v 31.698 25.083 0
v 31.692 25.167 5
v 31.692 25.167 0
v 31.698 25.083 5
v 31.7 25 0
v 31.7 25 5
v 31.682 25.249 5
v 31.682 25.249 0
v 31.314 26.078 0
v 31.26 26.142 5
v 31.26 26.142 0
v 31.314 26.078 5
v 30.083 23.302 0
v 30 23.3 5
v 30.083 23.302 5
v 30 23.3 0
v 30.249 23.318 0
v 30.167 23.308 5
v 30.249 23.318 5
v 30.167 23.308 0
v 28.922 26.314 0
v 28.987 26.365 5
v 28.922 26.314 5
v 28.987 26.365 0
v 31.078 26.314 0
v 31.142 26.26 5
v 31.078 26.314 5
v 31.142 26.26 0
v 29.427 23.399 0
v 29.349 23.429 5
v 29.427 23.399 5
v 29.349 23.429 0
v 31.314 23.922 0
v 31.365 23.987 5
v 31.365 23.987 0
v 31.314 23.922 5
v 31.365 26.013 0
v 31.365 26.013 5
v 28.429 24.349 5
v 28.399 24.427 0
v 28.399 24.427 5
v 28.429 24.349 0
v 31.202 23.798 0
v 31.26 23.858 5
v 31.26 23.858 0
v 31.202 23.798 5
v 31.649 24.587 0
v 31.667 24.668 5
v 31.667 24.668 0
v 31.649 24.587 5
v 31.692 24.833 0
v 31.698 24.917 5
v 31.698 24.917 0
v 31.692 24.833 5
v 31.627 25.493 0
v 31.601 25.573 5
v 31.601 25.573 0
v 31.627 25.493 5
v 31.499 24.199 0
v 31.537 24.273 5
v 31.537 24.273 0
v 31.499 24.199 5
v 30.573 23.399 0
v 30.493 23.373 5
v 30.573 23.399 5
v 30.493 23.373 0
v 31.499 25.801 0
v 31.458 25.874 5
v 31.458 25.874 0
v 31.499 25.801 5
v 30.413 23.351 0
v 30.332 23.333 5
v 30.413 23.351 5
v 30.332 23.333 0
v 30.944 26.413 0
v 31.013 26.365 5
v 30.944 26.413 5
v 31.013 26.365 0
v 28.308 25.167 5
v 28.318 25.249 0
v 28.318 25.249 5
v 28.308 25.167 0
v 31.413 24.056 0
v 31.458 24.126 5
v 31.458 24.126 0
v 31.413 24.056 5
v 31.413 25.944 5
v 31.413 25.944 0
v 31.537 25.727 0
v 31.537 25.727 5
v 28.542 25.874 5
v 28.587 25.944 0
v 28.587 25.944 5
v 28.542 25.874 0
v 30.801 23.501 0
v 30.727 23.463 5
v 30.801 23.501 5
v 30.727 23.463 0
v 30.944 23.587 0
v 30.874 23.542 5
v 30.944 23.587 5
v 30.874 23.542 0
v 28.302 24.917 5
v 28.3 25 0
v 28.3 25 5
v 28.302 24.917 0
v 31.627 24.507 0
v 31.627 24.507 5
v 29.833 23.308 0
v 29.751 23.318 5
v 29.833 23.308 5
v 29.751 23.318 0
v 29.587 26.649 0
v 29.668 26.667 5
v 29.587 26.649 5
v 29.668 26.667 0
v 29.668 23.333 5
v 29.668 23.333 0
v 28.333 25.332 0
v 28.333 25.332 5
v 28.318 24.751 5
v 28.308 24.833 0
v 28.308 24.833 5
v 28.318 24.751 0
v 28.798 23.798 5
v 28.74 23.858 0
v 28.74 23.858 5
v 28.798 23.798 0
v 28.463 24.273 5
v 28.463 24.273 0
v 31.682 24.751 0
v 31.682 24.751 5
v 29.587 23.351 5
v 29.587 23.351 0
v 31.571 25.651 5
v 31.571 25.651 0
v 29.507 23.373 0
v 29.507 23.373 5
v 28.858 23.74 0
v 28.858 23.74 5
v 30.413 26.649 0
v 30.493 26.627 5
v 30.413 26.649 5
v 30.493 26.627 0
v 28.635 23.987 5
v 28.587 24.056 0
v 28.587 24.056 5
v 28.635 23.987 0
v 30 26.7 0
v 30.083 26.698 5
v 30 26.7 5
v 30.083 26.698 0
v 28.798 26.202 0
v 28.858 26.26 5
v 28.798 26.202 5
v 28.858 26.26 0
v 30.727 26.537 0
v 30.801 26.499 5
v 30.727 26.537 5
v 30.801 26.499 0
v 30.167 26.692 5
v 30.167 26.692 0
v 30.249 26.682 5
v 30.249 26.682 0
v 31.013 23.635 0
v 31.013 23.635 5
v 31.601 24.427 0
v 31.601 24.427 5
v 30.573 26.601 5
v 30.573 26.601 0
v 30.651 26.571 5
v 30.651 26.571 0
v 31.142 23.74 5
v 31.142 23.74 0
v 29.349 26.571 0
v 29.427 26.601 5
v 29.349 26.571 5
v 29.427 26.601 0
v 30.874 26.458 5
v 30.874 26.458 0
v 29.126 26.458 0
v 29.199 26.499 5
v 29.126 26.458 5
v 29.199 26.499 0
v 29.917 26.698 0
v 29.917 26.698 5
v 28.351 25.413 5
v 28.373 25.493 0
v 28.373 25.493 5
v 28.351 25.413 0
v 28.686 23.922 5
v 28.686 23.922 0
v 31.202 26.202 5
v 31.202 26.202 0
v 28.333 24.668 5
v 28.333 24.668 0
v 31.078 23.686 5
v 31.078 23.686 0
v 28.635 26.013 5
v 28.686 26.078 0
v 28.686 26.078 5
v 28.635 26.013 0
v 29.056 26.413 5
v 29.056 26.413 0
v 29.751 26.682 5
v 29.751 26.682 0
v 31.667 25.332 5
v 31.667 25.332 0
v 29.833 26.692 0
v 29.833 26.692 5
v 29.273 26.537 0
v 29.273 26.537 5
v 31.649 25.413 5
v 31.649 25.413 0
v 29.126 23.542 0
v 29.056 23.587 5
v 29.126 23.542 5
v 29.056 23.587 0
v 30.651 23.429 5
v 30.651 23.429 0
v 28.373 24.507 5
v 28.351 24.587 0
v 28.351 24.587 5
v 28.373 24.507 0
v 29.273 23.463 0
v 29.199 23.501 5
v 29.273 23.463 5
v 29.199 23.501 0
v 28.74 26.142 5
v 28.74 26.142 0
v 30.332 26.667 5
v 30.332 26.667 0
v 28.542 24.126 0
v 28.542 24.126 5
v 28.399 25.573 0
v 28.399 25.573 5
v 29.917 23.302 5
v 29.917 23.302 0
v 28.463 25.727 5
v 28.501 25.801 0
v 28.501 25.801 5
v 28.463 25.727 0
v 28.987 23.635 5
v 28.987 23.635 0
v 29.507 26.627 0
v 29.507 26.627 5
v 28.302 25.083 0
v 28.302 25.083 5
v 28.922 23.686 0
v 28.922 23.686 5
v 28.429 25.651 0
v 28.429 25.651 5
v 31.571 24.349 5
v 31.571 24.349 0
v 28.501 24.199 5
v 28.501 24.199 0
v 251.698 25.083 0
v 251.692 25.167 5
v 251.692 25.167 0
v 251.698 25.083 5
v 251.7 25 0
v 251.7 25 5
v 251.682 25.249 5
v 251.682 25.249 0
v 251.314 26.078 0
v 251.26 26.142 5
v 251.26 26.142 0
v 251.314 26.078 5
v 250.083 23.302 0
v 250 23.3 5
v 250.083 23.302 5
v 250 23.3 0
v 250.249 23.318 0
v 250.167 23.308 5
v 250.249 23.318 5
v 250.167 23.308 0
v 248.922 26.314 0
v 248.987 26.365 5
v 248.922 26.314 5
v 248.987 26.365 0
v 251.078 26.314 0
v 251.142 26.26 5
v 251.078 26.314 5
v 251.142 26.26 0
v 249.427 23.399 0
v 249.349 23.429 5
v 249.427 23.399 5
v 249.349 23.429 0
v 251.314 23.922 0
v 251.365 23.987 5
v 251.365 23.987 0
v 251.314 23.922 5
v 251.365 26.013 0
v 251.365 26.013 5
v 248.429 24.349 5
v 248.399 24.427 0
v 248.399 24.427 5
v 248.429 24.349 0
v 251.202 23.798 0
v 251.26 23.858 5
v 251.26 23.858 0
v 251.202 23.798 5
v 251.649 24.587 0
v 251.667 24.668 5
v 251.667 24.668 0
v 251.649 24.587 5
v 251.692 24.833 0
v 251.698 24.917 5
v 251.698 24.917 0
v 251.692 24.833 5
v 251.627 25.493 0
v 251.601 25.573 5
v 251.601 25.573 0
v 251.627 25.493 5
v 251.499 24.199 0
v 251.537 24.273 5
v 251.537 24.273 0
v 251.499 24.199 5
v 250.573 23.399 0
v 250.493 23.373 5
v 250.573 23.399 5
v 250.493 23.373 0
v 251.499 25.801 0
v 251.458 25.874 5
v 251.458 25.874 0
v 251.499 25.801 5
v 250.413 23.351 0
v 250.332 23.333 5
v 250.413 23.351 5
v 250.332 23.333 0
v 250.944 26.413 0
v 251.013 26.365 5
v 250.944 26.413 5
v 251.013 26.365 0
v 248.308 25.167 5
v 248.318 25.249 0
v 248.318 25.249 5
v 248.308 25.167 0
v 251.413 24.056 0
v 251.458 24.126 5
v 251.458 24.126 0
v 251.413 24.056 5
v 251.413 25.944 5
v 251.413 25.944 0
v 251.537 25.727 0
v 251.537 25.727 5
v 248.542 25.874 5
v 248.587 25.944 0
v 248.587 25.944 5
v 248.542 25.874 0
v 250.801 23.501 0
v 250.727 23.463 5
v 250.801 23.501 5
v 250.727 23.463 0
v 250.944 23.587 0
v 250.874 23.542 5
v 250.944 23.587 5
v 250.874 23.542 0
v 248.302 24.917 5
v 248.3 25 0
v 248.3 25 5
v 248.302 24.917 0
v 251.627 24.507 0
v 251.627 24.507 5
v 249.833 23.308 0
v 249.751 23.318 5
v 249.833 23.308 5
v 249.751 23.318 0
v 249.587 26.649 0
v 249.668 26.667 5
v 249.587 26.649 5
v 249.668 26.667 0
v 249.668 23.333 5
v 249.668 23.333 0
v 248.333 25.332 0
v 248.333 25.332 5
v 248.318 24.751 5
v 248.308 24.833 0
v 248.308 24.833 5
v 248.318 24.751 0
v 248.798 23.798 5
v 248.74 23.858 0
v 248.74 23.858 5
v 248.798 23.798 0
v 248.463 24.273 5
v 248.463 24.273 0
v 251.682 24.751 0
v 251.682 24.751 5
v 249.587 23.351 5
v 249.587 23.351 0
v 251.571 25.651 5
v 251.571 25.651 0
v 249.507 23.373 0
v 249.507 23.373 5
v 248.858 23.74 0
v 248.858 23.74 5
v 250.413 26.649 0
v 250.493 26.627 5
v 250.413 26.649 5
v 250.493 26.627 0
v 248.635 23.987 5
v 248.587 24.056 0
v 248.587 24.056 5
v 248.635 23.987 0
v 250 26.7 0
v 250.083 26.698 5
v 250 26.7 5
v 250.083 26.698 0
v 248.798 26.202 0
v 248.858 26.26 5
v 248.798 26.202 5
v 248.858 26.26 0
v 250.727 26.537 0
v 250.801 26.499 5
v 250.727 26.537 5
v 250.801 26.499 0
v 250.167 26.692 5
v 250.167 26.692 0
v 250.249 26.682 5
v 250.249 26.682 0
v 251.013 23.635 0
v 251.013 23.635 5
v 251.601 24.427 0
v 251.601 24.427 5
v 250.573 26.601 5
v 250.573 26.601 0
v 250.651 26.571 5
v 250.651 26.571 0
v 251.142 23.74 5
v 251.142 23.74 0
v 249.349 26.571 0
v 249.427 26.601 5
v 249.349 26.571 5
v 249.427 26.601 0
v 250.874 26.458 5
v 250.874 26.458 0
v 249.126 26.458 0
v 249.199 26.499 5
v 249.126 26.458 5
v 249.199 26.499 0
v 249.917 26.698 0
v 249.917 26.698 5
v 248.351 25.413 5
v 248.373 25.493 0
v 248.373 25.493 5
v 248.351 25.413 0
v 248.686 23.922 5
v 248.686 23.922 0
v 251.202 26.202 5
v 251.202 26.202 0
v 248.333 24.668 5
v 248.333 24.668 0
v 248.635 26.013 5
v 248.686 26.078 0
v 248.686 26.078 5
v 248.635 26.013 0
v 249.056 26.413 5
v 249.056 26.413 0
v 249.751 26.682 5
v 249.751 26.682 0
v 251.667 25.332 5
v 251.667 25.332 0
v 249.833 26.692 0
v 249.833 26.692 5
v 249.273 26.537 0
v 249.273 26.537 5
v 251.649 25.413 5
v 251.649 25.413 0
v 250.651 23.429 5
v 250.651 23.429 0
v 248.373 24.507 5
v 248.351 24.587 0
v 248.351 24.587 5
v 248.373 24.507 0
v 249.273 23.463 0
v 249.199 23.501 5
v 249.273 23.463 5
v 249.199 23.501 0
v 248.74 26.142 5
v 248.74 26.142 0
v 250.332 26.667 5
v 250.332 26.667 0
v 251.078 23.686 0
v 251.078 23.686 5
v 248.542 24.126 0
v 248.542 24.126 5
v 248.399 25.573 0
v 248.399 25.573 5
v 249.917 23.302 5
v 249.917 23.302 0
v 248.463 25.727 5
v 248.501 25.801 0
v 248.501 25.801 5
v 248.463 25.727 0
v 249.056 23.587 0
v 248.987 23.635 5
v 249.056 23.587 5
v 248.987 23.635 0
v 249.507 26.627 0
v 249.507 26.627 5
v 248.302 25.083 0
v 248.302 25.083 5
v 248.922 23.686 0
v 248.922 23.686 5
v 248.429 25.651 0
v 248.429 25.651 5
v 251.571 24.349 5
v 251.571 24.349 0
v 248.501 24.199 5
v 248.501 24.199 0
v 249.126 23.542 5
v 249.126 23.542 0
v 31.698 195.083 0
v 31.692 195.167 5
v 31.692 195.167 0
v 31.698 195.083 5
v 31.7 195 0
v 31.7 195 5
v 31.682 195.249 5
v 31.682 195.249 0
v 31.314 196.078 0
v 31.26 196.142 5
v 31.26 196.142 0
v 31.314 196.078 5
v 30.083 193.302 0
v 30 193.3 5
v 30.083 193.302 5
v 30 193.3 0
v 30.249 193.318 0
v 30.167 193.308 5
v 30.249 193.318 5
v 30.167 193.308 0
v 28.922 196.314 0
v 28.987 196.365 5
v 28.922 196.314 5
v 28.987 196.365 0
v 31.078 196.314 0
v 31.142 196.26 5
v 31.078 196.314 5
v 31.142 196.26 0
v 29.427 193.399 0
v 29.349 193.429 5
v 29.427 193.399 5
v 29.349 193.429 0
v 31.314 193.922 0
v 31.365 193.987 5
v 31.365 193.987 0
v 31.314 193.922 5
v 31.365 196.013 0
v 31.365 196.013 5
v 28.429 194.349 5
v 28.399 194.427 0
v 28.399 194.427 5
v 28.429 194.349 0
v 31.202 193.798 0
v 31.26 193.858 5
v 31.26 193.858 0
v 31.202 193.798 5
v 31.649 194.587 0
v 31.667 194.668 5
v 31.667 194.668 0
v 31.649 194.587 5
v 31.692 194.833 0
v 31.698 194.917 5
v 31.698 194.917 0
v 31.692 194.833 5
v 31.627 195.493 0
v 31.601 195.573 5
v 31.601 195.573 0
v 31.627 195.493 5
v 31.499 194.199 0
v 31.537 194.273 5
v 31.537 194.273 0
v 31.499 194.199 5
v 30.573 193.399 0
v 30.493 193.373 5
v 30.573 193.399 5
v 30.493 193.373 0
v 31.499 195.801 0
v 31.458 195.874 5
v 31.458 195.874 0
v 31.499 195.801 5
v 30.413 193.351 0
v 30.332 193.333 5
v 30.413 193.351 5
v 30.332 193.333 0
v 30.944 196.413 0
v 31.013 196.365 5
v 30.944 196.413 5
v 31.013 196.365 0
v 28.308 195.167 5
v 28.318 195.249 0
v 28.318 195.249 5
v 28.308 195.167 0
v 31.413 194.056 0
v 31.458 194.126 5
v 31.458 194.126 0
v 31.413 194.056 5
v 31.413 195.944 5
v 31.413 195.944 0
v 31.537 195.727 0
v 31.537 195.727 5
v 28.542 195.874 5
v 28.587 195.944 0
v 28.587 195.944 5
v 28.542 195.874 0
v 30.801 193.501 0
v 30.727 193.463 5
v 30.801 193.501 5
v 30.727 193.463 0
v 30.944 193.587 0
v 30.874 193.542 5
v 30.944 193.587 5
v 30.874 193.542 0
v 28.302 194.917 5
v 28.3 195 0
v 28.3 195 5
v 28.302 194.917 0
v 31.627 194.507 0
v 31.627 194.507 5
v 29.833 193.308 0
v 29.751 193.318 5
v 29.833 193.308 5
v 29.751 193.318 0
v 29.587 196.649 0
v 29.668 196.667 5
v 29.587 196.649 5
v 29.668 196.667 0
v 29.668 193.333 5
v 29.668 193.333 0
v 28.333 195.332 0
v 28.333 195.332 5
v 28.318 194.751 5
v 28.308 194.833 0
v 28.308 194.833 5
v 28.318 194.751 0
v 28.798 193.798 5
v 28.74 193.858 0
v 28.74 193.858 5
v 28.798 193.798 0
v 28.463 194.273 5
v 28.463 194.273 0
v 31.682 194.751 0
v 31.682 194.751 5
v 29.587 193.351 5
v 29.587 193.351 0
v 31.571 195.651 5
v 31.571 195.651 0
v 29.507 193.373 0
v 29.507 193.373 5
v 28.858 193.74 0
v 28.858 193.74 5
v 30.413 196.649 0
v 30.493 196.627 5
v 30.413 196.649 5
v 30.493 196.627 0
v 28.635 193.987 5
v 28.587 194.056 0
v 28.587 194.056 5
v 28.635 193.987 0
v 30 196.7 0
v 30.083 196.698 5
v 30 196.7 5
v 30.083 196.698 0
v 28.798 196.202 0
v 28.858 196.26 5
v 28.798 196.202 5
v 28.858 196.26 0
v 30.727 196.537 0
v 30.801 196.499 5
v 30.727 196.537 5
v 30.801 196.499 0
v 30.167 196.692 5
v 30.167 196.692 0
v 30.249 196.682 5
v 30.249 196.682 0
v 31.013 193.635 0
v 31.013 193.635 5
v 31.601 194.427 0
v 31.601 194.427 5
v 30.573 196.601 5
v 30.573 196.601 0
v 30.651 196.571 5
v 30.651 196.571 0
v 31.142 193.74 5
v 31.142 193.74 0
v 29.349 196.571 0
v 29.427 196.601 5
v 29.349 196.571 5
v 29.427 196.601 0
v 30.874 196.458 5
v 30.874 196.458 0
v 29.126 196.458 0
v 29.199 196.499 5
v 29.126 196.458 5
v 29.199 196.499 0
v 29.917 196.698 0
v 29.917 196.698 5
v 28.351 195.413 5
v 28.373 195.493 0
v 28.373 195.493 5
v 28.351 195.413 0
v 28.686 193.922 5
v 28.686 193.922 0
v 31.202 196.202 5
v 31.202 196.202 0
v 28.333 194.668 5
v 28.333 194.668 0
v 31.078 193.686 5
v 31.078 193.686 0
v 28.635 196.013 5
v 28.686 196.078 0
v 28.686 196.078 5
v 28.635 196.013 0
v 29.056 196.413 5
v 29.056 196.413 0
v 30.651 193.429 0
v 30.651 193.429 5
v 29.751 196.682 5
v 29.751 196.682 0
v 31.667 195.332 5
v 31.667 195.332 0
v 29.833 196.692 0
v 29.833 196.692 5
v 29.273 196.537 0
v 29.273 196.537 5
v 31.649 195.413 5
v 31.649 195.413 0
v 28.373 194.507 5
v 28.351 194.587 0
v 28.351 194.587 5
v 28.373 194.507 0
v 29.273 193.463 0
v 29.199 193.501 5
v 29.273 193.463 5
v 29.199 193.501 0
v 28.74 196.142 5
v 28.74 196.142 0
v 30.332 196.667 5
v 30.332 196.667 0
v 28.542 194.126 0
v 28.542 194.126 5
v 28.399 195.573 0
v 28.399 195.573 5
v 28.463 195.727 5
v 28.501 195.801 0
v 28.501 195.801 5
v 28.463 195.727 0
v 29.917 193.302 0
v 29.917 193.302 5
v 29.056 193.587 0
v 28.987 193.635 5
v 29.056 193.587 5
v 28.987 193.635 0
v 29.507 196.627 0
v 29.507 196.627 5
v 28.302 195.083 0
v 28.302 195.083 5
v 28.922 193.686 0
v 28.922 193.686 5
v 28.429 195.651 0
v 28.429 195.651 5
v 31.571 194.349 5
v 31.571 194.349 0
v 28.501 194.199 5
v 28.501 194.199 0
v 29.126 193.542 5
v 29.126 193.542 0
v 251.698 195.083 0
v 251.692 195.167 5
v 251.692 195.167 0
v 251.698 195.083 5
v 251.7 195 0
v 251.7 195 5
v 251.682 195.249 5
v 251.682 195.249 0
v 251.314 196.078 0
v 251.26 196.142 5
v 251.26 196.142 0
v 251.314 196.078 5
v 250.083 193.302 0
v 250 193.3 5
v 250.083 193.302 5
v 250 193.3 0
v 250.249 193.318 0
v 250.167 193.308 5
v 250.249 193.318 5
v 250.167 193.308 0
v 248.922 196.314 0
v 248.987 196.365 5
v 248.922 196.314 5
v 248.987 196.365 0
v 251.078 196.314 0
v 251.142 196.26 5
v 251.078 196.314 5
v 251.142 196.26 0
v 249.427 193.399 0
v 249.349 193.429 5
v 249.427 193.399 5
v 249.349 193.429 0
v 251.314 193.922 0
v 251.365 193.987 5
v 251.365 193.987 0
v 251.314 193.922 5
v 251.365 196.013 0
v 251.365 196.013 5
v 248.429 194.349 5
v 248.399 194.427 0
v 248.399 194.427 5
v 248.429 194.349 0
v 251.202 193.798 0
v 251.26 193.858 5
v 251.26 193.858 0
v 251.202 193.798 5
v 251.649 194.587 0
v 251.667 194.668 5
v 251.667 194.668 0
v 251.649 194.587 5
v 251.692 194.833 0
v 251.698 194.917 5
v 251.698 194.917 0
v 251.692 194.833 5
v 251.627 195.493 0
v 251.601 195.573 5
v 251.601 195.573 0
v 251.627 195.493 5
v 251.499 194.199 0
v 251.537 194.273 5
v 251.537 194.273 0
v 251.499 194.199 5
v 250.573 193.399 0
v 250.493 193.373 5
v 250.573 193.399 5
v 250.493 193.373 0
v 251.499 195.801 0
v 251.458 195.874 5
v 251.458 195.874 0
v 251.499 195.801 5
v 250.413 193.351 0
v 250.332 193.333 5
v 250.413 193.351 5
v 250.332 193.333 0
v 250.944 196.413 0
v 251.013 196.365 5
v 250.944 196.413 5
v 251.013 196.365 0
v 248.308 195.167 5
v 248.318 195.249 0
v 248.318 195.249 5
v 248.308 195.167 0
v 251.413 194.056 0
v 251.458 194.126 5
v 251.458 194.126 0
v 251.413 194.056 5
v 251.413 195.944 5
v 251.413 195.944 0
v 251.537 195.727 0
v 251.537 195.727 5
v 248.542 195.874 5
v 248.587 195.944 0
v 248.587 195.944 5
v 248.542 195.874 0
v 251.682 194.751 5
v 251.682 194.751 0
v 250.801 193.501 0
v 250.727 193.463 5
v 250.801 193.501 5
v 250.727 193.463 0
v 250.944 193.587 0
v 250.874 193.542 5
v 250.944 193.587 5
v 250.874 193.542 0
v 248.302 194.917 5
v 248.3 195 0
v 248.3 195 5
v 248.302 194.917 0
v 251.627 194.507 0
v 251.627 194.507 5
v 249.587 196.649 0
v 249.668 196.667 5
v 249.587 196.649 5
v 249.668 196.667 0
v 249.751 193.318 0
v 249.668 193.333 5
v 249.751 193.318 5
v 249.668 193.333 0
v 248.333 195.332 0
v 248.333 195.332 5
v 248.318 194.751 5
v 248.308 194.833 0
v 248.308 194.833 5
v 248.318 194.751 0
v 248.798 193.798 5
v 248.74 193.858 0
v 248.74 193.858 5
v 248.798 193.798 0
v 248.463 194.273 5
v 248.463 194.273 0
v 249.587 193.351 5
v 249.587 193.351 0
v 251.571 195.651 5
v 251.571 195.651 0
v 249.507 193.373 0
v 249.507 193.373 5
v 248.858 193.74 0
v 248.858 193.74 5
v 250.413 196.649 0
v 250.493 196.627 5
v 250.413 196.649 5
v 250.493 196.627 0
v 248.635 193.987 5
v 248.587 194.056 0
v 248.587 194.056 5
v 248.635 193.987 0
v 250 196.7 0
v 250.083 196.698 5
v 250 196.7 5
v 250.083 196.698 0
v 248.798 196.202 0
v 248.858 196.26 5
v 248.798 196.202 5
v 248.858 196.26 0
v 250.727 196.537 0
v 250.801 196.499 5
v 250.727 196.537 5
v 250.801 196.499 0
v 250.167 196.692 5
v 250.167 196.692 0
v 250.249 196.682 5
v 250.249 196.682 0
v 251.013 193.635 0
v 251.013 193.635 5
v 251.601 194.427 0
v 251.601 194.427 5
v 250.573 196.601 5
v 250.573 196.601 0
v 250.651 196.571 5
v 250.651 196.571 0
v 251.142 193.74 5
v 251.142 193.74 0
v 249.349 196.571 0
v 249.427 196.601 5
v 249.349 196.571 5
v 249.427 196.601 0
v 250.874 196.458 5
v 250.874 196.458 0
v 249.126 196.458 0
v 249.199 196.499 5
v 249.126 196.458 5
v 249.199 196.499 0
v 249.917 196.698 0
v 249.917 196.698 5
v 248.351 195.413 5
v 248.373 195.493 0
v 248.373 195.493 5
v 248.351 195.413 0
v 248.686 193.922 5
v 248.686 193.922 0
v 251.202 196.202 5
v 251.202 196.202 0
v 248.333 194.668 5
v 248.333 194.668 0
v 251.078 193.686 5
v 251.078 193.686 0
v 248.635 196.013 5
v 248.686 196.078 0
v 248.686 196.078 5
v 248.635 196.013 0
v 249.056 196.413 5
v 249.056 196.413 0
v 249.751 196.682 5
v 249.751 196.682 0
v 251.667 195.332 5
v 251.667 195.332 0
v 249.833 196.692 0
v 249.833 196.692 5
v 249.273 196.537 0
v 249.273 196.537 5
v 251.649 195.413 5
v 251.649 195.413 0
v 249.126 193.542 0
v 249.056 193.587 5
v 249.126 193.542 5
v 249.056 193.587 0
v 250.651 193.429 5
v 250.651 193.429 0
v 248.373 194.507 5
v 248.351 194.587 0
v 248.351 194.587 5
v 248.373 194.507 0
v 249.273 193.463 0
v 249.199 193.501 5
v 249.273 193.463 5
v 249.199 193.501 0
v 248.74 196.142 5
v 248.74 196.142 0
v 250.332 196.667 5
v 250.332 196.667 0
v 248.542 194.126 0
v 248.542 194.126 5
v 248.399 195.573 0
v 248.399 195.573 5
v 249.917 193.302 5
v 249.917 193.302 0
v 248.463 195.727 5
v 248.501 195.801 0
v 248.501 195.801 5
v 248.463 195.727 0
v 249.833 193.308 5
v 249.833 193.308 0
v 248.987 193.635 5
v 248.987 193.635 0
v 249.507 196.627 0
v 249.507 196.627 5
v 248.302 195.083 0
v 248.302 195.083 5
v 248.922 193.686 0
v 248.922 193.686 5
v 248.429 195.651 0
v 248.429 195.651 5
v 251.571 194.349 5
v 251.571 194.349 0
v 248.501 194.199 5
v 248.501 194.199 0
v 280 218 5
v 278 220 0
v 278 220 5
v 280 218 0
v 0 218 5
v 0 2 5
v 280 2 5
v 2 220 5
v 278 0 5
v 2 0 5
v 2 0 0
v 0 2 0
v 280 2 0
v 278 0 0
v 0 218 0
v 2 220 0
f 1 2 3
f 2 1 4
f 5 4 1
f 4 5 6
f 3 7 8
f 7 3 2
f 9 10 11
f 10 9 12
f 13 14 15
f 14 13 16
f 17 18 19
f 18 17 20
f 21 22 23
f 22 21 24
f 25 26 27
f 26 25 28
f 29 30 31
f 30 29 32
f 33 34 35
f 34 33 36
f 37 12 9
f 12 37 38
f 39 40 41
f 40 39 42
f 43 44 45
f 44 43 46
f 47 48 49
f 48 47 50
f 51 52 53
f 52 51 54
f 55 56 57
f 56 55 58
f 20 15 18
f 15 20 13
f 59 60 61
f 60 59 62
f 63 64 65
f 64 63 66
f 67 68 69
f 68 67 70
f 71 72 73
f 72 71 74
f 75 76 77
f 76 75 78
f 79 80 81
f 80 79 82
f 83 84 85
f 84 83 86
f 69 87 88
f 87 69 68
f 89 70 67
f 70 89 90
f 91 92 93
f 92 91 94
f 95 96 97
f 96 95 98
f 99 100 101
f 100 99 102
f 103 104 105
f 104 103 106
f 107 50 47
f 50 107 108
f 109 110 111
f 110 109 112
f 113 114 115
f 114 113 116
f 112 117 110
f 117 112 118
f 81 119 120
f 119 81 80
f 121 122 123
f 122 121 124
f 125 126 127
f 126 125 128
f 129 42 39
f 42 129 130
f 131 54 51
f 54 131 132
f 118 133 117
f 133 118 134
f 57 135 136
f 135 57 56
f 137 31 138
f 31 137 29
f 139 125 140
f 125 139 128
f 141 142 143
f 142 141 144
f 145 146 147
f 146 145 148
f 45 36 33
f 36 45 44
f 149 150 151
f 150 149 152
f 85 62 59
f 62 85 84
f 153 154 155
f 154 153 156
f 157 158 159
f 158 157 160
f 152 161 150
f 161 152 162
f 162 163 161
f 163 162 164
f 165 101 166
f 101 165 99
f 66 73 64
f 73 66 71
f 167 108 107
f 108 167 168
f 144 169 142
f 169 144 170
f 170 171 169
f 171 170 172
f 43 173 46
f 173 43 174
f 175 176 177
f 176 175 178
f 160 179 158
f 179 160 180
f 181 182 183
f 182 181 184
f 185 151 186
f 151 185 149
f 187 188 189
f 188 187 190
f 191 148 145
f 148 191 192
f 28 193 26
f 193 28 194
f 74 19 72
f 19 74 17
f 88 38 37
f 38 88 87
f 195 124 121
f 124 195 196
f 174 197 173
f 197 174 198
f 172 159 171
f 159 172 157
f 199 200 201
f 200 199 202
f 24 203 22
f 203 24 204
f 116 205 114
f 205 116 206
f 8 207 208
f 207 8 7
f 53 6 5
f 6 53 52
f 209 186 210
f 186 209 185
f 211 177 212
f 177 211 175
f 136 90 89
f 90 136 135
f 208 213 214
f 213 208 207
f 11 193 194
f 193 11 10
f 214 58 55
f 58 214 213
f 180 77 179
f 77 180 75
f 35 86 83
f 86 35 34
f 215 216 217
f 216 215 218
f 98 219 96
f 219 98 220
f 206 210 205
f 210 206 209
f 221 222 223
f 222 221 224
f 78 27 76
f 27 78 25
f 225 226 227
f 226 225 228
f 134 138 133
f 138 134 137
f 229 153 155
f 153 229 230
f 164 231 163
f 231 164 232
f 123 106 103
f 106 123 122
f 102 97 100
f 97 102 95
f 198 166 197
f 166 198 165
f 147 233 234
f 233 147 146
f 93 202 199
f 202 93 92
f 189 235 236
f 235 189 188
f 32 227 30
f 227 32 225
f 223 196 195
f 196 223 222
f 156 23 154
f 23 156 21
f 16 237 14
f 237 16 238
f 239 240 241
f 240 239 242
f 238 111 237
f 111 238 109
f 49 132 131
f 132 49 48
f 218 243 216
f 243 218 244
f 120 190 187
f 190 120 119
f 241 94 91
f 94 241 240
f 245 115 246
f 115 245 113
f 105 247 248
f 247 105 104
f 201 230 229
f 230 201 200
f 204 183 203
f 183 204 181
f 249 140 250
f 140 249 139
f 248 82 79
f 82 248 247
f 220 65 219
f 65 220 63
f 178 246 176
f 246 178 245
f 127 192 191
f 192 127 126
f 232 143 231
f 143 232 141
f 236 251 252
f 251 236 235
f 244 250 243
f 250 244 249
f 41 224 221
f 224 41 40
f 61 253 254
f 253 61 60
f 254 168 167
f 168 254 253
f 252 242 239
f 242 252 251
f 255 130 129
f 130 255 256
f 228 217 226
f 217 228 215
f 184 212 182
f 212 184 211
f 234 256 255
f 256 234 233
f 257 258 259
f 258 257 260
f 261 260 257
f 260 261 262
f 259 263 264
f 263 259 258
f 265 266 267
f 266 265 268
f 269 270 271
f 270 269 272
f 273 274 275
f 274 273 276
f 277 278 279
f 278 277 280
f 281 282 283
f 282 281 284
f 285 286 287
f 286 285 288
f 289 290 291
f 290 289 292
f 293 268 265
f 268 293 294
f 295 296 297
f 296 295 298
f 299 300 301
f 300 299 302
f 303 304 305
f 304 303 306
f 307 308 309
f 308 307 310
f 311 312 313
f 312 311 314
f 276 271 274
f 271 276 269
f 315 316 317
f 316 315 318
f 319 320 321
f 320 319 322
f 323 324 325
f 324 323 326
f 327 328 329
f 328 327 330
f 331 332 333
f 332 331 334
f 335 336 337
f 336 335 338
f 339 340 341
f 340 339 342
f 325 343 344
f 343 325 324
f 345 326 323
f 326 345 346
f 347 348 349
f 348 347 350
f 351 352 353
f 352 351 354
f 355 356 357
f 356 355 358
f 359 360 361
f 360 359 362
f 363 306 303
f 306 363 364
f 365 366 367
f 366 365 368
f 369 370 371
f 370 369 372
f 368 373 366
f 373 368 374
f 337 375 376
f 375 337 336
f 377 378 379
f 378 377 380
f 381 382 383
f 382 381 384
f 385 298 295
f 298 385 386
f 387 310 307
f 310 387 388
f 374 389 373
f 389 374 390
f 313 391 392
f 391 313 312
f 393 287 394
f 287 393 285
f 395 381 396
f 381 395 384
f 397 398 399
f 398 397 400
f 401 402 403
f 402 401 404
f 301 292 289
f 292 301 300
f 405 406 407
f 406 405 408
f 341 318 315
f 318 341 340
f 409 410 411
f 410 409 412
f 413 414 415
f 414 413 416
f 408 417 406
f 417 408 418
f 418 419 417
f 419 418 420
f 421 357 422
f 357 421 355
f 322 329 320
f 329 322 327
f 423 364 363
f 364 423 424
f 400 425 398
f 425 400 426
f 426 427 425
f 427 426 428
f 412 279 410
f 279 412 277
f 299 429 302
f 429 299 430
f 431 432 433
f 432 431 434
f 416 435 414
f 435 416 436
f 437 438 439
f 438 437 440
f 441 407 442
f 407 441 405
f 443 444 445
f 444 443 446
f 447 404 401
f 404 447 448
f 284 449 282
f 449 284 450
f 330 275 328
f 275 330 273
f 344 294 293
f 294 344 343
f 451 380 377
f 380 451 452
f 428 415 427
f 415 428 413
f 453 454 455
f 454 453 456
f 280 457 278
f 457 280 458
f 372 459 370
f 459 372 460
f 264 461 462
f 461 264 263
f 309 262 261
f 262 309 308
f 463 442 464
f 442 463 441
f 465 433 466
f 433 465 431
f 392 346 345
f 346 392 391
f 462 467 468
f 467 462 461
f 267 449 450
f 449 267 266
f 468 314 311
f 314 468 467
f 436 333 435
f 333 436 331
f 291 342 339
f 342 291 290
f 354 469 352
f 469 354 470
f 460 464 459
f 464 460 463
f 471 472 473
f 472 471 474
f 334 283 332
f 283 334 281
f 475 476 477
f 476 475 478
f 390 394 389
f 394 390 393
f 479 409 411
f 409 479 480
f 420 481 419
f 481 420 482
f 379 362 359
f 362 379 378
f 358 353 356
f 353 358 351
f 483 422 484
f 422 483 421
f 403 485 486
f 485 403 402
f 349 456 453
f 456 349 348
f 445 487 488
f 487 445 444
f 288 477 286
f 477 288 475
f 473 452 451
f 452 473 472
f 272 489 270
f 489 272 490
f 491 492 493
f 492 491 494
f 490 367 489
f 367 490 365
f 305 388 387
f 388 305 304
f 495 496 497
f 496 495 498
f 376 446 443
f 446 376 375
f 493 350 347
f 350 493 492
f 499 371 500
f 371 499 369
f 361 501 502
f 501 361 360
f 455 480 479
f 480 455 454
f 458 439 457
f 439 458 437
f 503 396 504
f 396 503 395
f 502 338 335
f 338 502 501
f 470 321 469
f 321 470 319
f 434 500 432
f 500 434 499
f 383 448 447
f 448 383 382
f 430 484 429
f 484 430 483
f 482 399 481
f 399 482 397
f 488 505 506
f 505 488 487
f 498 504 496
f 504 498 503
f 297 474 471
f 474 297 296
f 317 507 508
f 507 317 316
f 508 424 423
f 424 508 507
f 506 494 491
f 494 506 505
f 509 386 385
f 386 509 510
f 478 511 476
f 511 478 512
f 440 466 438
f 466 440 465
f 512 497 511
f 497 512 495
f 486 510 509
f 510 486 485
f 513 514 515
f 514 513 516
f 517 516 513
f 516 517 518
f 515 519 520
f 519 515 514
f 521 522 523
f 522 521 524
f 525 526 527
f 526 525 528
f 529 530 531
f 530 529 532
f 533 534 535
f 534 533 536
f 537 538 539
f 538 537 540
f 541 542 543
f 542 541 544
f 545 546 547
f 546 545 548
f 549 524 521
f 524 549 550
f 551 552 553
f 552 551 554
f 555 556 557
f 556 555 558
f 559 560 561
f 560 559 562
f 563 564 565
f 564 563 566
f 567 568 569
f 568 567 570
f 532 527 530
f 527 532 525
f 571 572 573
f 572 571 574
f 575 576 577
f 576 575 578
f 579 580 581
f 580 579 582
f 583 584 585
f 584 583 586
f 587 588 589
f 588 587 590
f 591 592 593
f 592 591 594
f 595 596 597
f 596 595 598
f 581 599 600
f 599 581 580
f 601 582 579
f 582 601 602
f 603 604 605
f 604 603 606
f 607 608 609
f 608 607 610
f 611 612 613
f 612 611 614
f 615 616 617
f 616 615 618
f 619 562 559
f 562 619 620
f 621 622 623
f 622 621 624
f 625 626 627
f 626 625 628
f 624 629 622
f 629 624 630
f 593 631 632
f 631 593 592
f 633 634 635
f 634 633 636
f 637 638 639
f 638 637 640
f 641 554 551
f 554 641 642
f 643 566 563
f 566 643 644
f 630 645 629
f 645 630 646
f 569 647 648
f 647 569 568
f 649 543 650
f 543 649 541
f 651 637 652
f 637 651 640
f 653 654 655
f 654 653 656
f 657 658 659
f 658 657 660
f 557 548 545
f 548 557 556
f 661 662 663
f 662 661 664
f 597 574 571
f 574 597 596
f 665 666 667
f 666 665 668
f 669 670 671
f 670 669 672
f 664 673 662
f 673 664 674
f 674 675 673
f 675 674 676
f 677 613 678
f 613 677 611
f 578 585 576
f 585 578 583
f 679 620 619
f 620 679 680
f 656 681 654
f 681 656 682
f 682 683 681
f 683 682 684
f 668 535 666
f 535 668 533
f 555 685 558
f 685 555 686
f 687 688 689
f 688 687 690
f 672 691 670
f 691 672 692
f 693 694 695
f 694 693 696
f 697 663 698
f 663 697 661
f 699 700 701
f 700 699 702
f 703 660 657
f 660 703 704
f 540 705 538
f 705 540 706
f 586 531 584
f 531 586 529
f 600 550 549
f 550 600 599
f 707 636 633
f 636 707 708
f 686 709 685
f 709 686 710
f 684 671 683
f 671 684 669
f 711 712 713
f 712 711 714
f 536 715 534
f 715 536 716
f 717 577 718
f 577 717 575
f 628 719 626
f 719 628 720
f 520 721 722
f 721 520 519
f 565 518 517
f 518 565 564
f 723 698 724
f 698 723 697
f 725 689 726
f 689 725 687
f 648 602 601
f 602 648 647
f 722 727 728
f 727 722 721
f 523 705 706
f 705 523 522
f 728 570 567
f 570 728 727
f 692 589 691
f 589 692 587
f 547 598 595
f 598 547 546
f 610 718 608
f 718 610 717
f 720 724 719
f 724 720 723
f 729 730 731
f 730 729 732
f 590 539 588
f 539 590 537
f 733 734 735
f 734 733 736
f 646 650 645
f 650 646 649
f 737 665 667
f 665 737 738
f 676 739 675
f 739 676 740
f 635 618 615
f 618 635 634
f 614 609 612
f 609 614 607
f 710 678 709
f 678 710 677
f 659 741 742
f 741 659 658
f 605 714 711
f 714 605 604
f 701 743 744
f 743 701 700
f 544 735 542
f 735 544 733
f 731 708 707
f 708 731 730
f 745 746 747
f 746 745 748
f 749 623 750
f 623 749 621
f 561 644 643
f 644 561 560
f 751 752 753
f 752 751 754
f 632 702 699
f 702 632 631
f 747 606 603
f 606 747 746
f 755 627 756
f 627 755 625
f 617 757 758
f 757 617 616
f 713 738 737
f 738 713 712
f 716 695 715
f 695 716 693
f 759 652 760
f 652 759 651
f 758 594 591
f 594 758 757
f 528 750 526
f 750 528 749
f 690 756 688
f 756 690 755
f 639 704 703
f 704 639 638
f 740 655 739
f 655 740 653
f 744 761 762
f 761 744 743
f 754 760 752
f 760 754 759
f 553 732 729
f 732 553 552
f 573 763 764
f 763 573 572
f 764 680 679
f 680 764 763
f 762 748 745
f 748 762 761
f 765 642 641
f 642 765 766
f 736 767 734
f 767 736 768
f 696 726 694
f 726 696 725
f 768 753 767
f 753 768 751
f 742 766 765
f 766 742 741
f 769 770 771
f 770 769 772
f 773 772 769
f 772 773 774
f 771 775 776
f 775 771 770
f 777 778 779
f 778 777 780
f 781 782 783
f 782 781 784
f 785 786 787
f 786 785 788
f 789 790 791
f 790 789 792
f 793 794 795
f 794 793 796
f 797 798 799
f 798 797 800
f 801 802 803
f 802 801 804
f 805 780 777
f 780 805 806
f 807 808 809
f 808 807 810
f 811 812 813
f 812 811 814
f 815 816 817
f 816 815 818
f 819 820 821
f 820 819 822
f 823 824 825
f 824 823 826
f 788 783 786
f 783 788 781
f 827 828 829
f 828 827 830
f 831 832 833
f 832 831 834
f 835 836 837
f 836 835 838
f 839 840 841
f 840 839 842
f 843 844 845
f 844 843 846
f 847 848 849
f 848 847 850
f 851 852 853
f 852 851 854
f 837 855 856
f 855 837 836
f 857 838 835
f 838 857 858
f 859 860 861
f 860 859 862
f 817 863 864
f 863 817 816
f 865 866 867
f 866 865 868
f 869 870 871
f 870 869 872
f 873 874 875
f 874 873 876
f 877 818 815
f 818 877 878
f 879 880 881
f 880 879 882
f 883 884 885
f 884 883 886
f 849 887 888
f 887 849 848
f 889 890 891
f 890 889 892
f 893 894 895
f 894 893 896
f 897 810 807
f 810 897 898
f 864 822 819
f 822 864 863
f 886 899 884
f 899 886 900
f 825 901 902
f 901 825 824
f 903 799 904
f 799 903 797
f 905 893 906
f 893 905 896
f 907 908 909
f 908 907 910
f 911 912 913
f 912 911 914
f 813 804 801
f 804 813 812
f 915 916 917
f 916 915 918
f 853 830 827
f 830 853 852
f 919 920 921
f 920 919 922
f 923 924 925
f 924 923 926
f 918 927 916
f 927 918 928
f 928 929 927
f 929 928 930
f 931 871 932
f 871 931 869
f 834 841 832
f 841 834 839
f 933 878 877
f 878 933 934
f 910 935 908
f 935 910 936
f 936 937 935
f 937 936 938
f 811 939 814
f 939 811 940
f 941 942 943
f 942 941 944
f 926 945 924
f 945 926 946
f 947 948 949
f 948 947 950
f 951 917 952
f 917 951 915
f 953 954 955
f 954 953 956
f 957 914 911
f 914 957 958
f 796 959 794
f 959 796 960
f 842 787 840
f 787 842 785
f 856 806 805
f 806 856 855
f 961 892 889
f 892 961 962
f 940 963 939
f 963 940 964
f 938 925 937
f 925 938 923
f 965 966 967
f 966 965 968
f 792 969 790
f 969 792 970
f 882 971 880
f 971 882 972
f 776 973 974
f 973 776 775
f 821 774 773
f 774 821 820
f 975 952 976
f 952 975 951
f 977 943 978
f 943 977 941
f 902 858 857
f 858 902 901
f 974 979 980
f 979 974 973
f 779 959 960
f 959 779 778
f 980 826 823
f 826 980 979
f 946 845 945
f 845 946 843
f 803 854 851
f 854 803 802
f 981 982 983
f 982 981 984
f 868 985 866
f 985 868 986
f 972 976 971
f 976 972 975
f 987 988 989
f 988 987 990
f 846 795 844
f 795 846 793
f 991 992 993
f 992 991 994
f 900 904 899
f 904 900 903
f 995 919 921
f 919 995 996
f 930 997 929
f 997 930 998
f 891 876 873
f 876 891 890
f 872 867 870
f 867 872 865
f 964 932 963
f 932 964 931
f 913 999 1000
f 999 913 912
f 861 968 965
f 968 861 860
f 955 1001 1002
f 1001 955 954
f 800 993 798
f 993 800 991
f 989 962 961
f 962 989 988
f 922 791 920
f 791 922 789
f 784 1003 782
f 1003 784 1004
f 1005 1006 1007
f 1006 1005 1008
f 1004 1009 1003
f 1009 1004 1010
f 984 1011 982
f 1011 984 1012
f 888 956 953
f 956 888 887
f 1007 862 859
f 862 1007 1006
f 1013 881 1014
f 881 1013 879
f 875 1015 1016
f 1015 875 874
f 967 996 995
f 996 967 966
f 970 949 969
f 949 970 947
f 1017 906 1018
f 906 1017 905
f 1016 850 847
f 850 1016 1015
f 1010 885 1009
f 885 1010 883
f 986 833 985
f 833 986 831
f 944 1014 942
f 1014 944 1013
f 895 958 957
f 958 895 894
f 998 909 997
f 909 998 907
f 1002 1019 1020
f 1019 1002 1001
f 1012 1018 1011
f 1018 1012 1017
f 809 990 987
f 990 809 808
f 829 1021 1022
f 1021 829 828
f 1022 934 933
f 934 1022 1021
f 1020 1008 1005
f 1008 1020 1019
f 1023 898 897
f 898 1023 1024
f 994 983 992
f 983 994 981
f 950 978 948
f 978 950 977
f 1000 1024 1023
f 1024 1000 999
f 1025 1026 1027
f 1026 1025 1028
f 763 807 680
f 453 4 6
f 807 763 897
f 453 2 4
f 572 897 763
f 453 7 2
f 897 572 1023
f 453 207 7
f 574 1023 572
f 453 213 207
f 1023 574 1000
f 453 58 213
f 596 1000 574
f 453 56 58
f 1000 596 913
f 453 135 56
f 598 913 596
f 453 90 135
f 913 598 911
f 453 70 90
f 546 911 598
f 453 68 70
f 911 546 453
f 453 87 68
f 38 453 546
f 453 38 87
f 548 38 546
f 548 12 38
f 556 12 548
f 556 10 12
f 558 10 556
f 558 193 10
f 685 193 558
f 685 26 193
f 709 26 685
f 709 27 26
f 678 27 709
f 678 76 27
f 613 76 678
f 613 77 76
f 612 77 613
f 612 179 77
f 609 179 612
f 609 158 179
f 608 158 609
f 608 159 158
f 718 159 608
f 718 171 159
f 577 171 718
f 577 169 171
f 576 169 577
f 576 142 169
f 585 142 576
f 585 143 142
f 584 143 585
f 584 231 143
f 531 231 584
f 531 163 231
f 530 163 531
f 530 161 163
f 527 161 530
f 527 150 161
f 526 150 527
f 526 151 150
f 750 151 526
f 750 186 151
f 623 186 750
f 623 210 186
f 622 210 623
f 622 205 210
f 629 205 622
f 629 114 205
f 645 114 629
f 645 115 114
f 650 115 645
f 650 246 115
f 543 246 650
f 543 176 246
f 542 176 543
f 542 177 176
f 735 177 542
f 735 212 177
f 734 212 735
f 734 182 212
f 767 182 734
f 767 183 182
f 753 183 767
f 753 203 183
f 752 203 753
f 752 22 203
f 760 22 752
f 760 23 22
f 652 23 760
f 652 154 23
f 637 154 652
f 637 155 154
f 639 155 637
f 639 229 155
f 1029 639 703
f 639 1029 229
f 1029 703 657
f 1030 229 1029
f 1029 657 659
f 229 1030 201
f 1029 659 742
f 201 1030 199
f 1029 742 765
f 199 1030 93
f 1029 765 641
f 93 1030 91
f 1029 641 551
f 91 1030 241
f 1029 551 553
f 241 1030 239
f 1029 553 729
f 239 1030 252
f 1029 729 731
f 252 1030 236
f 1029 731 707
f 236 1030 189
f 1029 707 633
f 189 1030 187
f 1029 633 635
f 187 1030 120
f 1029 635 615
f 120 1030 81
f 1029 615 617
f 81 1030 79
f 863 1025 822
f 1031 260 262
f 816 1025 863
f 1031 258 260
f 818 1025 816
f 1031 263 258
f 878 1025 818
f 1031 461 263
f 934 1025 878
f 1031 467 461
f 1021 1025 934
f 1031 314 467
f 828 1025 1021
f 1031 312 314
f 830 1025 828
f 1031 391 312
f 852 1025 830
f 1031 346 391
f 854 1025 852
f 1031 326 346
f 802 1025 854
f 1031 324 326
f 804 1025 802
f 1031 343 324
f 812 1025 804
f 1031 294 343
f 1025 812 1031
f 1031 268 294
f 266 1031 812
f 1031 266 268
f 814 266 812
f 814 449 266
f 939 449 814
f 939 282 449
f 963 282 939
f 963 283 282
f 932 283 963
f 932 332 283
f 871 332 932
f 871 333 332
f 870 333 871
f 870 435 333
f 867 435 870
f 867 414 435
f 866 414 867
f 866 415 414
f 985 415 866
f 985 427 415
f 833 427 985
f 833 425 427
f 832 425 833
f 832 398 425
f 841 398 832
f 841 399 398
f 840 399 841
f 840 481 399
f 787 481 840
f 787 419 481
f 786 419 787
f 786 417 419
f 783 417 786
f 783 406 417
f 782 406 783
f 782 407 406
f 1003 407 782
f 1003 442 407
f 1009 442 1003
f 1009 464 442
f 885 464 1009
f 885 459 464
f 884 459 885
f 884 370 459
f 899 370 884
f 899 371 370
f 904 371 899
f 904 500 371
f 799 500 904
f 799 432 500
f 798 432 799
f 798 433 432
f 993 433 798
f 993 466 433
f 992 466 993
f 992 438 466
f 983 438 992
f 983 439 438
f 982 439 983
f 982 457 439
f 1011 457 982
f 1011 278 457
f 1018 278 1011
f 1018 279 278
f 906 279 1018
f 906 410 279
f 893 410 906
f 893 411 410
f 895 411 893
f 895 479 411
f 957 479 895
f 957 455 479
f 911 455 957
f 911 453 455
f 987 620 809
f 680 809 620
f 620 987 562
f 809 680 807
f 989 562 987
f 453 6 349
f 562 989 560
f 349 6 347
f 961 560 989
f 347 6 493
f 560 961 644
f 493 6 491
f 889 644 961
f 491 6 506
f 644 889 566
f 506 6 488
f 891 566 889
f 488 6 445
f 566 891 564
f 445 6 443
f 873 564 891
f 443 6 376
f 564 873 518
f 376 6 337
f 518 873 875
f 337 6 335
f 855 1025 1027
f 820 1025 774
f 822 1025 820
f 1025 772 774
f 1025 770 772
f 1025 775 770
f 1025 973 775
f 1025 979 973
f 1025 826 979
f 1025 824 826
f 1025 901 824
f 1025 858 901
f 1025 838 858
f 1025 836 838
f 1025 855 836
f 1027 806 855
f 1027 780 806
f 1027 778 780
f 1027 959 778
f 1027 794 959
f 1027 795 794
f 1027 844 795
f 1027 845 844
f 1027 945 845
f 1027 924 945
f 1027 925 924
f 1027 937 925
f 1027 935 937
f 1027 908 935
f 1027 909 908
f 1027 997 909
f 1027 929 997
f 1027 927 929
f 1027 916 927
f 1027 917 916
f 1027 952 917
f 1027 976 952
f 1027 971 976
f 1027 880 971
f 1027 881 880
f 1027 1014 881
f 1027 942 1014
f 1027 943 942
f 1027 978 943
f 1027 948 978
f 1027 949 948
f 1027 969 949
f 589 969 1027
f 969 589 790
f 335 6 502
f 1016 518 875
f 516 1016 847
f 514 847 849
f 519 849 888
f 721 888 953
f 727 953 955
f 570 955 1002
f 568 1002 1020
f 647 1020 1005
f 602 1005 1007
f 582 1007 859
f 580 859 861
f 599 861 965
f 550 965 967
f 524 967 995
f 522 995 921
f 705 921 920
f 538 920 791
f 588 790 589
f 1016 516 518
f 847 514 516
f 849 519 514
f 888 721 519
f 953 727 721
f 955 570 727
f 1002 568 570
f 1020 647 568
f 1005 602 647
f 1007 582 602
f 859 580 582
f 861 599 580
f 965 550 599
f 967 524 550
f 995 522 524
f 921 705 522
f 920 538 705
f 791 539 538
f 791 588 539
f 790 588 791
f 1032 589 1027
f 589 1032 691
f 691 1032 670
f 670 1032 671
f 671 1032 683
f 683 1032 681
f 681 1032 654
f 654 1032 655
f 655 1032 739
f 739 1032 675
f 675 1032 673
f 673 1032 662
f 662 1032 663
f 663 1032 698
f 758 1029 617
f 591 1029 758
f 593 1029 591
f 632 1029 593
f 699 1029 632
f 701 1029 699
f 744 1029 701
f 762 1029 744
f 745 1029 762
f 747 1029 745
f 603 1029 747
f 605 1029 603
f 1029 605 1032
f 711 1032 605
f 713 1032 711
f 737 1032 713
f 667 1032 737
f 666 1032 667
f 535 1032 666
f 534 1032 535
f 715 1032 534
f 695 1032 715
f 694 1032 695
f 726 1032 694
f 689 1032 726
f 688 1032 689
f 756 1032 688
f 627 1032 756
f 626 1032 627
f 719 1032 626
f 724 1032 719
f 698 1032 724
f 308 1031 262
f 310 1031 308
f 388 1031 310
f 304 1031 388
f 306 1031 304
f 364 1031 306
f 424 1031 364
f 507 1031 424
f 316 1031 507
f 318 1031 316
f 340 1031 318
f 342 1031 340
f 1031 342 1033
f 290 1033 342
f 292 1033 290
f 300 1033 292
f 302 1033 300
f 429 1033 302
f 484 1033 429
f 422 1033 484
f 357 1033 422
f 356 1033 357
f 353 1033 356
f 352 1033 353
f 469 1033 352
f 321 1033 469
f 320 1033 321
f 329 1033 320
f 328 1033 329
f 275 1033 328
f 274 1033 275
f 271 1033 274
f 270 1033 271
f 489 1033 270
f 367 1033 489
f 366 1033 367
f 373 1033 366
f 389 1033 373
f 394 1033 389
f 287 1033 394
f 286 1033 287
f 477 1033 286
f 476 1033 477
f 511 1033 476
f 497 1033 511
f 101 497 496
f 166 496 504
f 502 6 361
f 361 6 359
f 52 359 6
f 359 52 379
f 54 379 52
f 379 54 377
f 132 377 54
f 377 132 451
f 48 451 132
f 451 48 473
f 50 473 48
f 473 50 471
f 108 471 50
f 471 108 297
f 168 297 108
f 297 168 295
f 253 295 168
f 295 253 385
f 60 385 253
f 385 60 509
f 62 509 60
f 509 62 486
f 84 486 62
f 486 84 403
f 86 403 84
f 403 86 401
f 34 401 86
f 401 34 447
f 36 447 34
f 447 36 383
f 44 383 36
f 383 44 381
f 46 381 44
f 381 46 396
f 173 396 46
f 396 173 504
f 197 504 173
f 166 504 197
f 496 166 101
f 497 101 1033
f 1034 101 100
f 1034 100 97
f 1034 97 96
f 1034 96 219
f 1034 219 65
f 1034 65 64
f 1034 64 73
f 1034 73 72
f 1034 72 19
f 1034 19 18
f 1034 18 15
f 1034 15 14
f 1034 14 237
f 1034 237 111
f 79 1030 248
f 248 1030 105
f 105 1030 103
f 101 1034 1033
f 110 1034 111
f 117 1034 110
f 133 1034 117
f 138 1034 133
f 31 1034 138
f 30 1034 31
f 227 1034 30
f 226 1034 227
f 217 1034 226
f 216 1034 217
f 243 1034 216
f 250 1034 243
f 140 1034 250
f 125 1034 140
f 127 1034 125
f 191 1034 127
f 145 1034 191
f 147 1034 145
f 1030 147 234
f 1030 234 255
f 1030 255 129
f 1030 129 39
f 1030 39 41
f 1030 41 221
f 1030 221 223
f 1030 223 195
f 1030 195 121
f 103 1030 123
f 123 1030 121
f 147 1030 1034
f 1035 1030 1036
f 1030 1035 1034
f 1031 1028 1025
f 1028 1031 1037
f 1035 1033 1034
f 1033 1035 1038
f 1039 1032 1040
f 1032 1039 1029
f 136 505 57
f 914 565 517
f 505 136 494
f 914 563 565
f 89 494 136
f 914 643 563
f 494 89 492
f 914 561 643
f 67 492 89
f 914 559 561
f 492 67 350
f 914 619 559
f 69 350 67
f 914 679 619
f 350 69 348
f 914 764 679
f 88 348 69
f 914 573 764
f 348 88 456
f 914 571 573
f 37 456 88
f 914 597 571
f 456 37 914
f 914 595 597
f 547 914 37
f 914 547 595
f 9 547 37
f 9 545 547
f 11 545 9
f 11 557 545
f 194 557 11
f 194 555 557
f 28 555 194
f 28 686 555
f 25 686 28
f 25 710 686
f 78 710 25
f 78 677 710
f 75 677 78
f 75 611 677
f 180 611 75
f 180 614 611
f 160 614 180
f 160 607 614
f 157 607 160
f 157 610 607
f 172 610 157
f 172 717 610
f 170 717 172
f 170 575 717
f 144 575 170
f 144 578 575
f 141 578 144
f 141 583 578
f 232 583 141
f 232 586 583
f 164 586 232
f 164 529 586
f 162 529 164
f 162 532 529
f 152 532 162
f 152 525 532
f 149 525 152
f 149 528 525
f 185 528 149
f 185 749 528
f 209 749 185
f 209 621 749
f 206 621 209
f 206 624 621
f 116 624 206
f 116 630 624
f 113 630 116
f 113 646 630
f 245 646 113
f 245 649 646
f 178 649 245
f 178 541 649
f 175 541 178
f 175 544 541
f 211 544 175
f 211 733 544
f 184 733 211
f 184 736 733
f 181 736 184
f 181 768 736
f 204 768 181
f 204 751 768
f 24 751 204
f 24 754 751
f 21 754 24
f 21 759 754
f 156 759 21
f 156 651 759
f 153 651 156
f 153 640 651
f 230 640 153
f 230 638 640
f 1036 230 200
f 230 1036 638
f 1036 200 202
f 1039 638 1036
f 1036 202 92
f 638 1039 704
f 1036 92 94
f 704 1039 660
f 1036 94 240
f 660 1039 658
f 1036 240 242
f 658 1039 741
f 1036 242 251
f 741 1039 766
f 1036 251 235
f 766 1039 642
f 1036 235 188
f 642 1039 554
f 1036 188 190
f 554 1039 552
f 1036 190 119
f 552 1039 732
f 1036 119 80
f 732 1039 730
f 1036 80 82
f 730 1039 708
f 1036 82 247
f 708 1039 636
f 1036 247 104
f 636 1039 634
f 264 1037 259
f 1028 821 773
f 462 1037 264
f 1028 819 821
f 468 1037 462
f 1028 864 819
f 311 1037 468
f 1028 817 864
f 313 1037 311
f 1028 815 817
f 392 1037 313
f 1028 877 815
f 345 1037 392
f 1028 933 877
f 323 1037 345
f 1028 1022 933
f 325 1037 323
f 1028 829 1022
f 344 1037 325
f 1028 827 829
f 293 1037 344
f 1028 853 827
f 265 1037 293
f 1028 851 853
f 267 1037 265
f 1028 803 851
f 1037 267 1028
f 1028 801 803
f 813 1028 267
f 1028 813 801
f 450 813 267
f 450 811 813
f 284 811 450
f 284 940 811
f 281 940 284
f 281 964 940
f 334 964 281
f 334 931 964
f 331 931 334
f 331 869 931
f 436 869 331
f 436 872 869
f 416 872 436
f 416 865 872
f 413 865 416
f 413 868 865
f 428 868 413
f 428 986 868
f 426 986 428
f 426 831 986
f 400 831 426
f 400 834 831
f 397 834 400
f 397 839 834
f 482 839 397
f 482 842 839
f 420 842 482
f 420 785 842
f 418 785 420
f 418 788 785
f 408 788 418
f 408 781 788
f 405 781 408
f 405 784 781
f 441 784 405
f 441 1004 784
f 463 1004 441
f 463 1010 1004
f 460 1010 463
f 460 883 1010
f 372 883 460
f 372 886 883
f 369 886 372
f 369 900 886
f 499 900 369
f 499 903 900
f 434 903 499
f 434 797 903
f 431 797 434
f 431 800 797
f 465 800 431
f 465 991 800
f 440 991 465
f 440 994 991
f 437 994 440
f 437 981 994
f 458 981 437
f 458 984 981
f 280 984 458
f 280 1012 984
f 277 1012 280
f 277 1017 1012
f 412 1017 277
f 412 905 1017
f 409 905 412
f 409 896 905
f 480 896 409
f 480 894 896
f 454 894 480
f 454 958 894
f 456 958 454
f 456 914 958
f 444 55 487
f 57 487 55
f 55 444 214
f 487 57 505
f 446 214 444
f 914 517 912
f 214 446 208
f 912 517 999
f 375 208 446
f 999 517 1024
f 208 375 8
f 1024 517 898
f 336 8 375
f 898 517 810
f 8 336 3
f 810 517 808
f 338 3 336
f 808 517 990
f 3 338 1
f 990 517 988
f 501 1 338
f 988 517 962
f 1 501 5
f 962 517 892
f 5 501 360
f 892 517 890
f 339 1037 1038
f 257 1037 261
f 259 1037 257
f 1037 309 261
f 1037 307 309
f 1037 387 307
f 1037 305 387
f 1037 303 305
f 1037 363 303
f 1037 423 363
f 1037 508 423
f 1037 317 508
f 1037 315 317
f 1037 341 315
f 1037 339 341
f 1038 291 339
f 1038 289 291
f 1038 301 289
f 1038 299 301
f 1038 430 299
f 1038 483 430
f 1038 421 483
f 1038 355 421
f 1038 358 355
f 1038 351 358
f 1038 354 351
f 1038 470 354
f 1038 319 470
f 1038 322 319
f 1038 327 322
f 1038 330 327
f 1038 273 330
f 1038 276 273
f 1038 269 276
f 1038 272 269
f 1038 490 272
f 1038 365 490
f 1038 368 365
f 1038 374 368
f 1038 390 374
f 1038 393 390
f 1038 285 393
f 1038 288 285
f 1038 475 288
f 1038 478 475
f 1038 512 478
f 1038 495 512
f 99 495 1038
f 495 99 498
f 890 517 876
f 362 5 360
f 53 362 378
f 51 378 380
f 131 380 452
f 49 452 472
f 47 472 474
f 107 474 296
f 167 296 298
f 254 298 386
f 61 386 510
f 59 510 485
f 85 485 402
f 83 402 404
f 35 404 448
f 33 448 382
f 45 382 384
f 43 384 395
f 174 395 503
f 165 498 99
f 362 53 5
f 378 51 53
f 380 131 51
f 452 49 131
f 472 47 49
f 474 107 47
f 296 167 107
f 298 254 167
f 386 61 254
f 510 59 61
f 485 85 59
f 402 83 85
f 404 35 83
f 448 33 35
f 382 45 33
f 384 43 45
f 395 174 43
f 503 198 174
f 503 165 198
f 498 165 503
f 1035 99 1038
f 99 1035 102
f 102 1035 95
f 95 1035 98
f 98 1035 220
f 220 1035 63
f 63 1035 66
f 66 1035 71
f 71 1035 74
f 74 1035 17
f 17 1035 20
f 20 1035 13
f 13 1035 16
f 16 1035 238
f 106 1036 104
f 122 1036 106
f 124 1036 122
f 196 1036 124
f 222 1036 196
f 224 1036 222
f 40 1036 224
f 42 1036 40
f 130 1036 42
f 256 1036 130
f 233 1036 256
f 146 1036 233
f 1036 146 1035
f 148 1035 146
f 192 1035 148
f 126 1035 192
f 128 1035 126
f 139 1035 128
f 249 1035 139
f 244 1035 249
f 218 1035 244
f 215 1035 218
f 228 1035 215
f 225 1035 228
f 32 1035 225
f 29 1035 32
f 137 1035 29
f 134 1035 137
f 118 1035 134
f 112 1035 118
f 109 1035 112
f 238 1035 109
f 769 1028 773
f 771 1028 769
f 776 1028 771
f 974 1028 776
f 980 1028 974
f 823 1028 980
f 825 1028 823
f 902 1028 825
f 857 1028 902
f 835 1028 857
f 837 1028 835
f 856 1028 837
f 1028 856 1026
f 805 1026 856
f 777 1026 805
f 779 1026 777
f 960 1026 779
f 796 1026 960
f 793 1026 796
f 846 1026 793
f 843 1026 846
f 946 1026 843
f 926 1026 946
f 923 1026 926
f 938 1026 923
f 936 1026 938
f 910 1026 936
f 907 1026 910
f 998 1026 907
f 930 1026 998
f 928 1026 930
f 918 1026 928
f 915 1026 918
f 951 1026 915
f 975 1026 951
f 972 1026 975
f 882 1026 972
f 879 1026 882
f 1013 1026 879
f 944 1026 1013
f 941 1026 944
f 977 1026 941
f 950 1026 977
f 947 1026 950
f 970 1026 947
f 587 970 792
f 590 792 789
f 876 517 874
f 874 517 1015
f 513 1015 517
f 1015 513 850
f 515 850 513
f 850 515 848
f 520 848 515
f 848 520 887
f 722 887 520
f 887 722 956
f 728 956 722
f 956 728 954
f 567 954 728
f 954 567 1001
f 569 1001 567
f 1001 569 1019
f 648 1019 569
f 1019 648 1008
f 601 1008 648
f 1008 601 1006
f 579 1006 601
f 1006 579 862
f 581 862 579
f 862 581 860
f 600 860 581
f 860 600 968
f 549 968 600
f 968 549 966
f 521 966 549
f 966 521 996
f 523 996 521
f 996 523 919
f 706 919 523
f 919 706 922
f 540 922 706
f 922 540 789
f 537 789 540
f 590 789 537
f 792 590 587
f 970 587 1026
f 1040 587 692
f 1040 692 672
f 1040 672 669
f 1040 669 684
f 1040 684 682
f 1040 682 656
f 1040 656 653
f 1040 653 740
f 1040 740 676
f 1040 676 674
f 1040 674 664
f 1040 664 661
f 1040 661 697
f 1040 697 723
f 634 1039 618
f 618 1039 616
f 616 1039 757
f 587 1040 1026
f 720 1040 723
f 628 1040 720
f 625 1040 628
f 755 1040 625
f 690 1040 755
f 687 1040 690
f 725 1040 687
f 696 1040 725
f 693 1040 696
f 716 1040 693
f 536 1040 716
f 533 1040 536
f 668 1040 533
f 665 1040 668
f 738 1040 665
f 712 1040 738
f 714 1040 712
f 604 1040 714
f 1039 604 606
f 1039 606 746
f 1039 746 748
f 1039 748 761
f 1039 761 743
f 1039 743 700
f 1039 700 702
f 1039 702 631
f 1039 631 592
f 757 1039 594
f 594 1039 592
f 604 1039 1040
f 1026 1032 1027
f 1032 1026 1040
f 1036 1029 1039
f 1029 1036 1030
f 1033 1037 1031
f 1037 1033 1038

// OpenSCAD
// Units: mm. Set part to P01 or P02. Whole plates only; split CAD is build_models.py.
$fn=128;
part="P01";
thickness=5;
hole_d=3.4;
module plate(L,W,H){
 difference(){
 linear_extrude(thickness) polygon([[2,0],[L-2,0],[L,2],[L,W-2],[L-2,W],[2,W],[0,W-2],[0,2]]);
 for(p=H) translate([p[0],p[1],-1]) cylinder(h=thickness+2,d=hole_d);
 }
}
if(part=="P01") plate(280,220,[[30,25],[250,25],[30,195],[250,195]]);
else plate(240,190,[[10,10],[230,10],[10,180],[230,180]]);
